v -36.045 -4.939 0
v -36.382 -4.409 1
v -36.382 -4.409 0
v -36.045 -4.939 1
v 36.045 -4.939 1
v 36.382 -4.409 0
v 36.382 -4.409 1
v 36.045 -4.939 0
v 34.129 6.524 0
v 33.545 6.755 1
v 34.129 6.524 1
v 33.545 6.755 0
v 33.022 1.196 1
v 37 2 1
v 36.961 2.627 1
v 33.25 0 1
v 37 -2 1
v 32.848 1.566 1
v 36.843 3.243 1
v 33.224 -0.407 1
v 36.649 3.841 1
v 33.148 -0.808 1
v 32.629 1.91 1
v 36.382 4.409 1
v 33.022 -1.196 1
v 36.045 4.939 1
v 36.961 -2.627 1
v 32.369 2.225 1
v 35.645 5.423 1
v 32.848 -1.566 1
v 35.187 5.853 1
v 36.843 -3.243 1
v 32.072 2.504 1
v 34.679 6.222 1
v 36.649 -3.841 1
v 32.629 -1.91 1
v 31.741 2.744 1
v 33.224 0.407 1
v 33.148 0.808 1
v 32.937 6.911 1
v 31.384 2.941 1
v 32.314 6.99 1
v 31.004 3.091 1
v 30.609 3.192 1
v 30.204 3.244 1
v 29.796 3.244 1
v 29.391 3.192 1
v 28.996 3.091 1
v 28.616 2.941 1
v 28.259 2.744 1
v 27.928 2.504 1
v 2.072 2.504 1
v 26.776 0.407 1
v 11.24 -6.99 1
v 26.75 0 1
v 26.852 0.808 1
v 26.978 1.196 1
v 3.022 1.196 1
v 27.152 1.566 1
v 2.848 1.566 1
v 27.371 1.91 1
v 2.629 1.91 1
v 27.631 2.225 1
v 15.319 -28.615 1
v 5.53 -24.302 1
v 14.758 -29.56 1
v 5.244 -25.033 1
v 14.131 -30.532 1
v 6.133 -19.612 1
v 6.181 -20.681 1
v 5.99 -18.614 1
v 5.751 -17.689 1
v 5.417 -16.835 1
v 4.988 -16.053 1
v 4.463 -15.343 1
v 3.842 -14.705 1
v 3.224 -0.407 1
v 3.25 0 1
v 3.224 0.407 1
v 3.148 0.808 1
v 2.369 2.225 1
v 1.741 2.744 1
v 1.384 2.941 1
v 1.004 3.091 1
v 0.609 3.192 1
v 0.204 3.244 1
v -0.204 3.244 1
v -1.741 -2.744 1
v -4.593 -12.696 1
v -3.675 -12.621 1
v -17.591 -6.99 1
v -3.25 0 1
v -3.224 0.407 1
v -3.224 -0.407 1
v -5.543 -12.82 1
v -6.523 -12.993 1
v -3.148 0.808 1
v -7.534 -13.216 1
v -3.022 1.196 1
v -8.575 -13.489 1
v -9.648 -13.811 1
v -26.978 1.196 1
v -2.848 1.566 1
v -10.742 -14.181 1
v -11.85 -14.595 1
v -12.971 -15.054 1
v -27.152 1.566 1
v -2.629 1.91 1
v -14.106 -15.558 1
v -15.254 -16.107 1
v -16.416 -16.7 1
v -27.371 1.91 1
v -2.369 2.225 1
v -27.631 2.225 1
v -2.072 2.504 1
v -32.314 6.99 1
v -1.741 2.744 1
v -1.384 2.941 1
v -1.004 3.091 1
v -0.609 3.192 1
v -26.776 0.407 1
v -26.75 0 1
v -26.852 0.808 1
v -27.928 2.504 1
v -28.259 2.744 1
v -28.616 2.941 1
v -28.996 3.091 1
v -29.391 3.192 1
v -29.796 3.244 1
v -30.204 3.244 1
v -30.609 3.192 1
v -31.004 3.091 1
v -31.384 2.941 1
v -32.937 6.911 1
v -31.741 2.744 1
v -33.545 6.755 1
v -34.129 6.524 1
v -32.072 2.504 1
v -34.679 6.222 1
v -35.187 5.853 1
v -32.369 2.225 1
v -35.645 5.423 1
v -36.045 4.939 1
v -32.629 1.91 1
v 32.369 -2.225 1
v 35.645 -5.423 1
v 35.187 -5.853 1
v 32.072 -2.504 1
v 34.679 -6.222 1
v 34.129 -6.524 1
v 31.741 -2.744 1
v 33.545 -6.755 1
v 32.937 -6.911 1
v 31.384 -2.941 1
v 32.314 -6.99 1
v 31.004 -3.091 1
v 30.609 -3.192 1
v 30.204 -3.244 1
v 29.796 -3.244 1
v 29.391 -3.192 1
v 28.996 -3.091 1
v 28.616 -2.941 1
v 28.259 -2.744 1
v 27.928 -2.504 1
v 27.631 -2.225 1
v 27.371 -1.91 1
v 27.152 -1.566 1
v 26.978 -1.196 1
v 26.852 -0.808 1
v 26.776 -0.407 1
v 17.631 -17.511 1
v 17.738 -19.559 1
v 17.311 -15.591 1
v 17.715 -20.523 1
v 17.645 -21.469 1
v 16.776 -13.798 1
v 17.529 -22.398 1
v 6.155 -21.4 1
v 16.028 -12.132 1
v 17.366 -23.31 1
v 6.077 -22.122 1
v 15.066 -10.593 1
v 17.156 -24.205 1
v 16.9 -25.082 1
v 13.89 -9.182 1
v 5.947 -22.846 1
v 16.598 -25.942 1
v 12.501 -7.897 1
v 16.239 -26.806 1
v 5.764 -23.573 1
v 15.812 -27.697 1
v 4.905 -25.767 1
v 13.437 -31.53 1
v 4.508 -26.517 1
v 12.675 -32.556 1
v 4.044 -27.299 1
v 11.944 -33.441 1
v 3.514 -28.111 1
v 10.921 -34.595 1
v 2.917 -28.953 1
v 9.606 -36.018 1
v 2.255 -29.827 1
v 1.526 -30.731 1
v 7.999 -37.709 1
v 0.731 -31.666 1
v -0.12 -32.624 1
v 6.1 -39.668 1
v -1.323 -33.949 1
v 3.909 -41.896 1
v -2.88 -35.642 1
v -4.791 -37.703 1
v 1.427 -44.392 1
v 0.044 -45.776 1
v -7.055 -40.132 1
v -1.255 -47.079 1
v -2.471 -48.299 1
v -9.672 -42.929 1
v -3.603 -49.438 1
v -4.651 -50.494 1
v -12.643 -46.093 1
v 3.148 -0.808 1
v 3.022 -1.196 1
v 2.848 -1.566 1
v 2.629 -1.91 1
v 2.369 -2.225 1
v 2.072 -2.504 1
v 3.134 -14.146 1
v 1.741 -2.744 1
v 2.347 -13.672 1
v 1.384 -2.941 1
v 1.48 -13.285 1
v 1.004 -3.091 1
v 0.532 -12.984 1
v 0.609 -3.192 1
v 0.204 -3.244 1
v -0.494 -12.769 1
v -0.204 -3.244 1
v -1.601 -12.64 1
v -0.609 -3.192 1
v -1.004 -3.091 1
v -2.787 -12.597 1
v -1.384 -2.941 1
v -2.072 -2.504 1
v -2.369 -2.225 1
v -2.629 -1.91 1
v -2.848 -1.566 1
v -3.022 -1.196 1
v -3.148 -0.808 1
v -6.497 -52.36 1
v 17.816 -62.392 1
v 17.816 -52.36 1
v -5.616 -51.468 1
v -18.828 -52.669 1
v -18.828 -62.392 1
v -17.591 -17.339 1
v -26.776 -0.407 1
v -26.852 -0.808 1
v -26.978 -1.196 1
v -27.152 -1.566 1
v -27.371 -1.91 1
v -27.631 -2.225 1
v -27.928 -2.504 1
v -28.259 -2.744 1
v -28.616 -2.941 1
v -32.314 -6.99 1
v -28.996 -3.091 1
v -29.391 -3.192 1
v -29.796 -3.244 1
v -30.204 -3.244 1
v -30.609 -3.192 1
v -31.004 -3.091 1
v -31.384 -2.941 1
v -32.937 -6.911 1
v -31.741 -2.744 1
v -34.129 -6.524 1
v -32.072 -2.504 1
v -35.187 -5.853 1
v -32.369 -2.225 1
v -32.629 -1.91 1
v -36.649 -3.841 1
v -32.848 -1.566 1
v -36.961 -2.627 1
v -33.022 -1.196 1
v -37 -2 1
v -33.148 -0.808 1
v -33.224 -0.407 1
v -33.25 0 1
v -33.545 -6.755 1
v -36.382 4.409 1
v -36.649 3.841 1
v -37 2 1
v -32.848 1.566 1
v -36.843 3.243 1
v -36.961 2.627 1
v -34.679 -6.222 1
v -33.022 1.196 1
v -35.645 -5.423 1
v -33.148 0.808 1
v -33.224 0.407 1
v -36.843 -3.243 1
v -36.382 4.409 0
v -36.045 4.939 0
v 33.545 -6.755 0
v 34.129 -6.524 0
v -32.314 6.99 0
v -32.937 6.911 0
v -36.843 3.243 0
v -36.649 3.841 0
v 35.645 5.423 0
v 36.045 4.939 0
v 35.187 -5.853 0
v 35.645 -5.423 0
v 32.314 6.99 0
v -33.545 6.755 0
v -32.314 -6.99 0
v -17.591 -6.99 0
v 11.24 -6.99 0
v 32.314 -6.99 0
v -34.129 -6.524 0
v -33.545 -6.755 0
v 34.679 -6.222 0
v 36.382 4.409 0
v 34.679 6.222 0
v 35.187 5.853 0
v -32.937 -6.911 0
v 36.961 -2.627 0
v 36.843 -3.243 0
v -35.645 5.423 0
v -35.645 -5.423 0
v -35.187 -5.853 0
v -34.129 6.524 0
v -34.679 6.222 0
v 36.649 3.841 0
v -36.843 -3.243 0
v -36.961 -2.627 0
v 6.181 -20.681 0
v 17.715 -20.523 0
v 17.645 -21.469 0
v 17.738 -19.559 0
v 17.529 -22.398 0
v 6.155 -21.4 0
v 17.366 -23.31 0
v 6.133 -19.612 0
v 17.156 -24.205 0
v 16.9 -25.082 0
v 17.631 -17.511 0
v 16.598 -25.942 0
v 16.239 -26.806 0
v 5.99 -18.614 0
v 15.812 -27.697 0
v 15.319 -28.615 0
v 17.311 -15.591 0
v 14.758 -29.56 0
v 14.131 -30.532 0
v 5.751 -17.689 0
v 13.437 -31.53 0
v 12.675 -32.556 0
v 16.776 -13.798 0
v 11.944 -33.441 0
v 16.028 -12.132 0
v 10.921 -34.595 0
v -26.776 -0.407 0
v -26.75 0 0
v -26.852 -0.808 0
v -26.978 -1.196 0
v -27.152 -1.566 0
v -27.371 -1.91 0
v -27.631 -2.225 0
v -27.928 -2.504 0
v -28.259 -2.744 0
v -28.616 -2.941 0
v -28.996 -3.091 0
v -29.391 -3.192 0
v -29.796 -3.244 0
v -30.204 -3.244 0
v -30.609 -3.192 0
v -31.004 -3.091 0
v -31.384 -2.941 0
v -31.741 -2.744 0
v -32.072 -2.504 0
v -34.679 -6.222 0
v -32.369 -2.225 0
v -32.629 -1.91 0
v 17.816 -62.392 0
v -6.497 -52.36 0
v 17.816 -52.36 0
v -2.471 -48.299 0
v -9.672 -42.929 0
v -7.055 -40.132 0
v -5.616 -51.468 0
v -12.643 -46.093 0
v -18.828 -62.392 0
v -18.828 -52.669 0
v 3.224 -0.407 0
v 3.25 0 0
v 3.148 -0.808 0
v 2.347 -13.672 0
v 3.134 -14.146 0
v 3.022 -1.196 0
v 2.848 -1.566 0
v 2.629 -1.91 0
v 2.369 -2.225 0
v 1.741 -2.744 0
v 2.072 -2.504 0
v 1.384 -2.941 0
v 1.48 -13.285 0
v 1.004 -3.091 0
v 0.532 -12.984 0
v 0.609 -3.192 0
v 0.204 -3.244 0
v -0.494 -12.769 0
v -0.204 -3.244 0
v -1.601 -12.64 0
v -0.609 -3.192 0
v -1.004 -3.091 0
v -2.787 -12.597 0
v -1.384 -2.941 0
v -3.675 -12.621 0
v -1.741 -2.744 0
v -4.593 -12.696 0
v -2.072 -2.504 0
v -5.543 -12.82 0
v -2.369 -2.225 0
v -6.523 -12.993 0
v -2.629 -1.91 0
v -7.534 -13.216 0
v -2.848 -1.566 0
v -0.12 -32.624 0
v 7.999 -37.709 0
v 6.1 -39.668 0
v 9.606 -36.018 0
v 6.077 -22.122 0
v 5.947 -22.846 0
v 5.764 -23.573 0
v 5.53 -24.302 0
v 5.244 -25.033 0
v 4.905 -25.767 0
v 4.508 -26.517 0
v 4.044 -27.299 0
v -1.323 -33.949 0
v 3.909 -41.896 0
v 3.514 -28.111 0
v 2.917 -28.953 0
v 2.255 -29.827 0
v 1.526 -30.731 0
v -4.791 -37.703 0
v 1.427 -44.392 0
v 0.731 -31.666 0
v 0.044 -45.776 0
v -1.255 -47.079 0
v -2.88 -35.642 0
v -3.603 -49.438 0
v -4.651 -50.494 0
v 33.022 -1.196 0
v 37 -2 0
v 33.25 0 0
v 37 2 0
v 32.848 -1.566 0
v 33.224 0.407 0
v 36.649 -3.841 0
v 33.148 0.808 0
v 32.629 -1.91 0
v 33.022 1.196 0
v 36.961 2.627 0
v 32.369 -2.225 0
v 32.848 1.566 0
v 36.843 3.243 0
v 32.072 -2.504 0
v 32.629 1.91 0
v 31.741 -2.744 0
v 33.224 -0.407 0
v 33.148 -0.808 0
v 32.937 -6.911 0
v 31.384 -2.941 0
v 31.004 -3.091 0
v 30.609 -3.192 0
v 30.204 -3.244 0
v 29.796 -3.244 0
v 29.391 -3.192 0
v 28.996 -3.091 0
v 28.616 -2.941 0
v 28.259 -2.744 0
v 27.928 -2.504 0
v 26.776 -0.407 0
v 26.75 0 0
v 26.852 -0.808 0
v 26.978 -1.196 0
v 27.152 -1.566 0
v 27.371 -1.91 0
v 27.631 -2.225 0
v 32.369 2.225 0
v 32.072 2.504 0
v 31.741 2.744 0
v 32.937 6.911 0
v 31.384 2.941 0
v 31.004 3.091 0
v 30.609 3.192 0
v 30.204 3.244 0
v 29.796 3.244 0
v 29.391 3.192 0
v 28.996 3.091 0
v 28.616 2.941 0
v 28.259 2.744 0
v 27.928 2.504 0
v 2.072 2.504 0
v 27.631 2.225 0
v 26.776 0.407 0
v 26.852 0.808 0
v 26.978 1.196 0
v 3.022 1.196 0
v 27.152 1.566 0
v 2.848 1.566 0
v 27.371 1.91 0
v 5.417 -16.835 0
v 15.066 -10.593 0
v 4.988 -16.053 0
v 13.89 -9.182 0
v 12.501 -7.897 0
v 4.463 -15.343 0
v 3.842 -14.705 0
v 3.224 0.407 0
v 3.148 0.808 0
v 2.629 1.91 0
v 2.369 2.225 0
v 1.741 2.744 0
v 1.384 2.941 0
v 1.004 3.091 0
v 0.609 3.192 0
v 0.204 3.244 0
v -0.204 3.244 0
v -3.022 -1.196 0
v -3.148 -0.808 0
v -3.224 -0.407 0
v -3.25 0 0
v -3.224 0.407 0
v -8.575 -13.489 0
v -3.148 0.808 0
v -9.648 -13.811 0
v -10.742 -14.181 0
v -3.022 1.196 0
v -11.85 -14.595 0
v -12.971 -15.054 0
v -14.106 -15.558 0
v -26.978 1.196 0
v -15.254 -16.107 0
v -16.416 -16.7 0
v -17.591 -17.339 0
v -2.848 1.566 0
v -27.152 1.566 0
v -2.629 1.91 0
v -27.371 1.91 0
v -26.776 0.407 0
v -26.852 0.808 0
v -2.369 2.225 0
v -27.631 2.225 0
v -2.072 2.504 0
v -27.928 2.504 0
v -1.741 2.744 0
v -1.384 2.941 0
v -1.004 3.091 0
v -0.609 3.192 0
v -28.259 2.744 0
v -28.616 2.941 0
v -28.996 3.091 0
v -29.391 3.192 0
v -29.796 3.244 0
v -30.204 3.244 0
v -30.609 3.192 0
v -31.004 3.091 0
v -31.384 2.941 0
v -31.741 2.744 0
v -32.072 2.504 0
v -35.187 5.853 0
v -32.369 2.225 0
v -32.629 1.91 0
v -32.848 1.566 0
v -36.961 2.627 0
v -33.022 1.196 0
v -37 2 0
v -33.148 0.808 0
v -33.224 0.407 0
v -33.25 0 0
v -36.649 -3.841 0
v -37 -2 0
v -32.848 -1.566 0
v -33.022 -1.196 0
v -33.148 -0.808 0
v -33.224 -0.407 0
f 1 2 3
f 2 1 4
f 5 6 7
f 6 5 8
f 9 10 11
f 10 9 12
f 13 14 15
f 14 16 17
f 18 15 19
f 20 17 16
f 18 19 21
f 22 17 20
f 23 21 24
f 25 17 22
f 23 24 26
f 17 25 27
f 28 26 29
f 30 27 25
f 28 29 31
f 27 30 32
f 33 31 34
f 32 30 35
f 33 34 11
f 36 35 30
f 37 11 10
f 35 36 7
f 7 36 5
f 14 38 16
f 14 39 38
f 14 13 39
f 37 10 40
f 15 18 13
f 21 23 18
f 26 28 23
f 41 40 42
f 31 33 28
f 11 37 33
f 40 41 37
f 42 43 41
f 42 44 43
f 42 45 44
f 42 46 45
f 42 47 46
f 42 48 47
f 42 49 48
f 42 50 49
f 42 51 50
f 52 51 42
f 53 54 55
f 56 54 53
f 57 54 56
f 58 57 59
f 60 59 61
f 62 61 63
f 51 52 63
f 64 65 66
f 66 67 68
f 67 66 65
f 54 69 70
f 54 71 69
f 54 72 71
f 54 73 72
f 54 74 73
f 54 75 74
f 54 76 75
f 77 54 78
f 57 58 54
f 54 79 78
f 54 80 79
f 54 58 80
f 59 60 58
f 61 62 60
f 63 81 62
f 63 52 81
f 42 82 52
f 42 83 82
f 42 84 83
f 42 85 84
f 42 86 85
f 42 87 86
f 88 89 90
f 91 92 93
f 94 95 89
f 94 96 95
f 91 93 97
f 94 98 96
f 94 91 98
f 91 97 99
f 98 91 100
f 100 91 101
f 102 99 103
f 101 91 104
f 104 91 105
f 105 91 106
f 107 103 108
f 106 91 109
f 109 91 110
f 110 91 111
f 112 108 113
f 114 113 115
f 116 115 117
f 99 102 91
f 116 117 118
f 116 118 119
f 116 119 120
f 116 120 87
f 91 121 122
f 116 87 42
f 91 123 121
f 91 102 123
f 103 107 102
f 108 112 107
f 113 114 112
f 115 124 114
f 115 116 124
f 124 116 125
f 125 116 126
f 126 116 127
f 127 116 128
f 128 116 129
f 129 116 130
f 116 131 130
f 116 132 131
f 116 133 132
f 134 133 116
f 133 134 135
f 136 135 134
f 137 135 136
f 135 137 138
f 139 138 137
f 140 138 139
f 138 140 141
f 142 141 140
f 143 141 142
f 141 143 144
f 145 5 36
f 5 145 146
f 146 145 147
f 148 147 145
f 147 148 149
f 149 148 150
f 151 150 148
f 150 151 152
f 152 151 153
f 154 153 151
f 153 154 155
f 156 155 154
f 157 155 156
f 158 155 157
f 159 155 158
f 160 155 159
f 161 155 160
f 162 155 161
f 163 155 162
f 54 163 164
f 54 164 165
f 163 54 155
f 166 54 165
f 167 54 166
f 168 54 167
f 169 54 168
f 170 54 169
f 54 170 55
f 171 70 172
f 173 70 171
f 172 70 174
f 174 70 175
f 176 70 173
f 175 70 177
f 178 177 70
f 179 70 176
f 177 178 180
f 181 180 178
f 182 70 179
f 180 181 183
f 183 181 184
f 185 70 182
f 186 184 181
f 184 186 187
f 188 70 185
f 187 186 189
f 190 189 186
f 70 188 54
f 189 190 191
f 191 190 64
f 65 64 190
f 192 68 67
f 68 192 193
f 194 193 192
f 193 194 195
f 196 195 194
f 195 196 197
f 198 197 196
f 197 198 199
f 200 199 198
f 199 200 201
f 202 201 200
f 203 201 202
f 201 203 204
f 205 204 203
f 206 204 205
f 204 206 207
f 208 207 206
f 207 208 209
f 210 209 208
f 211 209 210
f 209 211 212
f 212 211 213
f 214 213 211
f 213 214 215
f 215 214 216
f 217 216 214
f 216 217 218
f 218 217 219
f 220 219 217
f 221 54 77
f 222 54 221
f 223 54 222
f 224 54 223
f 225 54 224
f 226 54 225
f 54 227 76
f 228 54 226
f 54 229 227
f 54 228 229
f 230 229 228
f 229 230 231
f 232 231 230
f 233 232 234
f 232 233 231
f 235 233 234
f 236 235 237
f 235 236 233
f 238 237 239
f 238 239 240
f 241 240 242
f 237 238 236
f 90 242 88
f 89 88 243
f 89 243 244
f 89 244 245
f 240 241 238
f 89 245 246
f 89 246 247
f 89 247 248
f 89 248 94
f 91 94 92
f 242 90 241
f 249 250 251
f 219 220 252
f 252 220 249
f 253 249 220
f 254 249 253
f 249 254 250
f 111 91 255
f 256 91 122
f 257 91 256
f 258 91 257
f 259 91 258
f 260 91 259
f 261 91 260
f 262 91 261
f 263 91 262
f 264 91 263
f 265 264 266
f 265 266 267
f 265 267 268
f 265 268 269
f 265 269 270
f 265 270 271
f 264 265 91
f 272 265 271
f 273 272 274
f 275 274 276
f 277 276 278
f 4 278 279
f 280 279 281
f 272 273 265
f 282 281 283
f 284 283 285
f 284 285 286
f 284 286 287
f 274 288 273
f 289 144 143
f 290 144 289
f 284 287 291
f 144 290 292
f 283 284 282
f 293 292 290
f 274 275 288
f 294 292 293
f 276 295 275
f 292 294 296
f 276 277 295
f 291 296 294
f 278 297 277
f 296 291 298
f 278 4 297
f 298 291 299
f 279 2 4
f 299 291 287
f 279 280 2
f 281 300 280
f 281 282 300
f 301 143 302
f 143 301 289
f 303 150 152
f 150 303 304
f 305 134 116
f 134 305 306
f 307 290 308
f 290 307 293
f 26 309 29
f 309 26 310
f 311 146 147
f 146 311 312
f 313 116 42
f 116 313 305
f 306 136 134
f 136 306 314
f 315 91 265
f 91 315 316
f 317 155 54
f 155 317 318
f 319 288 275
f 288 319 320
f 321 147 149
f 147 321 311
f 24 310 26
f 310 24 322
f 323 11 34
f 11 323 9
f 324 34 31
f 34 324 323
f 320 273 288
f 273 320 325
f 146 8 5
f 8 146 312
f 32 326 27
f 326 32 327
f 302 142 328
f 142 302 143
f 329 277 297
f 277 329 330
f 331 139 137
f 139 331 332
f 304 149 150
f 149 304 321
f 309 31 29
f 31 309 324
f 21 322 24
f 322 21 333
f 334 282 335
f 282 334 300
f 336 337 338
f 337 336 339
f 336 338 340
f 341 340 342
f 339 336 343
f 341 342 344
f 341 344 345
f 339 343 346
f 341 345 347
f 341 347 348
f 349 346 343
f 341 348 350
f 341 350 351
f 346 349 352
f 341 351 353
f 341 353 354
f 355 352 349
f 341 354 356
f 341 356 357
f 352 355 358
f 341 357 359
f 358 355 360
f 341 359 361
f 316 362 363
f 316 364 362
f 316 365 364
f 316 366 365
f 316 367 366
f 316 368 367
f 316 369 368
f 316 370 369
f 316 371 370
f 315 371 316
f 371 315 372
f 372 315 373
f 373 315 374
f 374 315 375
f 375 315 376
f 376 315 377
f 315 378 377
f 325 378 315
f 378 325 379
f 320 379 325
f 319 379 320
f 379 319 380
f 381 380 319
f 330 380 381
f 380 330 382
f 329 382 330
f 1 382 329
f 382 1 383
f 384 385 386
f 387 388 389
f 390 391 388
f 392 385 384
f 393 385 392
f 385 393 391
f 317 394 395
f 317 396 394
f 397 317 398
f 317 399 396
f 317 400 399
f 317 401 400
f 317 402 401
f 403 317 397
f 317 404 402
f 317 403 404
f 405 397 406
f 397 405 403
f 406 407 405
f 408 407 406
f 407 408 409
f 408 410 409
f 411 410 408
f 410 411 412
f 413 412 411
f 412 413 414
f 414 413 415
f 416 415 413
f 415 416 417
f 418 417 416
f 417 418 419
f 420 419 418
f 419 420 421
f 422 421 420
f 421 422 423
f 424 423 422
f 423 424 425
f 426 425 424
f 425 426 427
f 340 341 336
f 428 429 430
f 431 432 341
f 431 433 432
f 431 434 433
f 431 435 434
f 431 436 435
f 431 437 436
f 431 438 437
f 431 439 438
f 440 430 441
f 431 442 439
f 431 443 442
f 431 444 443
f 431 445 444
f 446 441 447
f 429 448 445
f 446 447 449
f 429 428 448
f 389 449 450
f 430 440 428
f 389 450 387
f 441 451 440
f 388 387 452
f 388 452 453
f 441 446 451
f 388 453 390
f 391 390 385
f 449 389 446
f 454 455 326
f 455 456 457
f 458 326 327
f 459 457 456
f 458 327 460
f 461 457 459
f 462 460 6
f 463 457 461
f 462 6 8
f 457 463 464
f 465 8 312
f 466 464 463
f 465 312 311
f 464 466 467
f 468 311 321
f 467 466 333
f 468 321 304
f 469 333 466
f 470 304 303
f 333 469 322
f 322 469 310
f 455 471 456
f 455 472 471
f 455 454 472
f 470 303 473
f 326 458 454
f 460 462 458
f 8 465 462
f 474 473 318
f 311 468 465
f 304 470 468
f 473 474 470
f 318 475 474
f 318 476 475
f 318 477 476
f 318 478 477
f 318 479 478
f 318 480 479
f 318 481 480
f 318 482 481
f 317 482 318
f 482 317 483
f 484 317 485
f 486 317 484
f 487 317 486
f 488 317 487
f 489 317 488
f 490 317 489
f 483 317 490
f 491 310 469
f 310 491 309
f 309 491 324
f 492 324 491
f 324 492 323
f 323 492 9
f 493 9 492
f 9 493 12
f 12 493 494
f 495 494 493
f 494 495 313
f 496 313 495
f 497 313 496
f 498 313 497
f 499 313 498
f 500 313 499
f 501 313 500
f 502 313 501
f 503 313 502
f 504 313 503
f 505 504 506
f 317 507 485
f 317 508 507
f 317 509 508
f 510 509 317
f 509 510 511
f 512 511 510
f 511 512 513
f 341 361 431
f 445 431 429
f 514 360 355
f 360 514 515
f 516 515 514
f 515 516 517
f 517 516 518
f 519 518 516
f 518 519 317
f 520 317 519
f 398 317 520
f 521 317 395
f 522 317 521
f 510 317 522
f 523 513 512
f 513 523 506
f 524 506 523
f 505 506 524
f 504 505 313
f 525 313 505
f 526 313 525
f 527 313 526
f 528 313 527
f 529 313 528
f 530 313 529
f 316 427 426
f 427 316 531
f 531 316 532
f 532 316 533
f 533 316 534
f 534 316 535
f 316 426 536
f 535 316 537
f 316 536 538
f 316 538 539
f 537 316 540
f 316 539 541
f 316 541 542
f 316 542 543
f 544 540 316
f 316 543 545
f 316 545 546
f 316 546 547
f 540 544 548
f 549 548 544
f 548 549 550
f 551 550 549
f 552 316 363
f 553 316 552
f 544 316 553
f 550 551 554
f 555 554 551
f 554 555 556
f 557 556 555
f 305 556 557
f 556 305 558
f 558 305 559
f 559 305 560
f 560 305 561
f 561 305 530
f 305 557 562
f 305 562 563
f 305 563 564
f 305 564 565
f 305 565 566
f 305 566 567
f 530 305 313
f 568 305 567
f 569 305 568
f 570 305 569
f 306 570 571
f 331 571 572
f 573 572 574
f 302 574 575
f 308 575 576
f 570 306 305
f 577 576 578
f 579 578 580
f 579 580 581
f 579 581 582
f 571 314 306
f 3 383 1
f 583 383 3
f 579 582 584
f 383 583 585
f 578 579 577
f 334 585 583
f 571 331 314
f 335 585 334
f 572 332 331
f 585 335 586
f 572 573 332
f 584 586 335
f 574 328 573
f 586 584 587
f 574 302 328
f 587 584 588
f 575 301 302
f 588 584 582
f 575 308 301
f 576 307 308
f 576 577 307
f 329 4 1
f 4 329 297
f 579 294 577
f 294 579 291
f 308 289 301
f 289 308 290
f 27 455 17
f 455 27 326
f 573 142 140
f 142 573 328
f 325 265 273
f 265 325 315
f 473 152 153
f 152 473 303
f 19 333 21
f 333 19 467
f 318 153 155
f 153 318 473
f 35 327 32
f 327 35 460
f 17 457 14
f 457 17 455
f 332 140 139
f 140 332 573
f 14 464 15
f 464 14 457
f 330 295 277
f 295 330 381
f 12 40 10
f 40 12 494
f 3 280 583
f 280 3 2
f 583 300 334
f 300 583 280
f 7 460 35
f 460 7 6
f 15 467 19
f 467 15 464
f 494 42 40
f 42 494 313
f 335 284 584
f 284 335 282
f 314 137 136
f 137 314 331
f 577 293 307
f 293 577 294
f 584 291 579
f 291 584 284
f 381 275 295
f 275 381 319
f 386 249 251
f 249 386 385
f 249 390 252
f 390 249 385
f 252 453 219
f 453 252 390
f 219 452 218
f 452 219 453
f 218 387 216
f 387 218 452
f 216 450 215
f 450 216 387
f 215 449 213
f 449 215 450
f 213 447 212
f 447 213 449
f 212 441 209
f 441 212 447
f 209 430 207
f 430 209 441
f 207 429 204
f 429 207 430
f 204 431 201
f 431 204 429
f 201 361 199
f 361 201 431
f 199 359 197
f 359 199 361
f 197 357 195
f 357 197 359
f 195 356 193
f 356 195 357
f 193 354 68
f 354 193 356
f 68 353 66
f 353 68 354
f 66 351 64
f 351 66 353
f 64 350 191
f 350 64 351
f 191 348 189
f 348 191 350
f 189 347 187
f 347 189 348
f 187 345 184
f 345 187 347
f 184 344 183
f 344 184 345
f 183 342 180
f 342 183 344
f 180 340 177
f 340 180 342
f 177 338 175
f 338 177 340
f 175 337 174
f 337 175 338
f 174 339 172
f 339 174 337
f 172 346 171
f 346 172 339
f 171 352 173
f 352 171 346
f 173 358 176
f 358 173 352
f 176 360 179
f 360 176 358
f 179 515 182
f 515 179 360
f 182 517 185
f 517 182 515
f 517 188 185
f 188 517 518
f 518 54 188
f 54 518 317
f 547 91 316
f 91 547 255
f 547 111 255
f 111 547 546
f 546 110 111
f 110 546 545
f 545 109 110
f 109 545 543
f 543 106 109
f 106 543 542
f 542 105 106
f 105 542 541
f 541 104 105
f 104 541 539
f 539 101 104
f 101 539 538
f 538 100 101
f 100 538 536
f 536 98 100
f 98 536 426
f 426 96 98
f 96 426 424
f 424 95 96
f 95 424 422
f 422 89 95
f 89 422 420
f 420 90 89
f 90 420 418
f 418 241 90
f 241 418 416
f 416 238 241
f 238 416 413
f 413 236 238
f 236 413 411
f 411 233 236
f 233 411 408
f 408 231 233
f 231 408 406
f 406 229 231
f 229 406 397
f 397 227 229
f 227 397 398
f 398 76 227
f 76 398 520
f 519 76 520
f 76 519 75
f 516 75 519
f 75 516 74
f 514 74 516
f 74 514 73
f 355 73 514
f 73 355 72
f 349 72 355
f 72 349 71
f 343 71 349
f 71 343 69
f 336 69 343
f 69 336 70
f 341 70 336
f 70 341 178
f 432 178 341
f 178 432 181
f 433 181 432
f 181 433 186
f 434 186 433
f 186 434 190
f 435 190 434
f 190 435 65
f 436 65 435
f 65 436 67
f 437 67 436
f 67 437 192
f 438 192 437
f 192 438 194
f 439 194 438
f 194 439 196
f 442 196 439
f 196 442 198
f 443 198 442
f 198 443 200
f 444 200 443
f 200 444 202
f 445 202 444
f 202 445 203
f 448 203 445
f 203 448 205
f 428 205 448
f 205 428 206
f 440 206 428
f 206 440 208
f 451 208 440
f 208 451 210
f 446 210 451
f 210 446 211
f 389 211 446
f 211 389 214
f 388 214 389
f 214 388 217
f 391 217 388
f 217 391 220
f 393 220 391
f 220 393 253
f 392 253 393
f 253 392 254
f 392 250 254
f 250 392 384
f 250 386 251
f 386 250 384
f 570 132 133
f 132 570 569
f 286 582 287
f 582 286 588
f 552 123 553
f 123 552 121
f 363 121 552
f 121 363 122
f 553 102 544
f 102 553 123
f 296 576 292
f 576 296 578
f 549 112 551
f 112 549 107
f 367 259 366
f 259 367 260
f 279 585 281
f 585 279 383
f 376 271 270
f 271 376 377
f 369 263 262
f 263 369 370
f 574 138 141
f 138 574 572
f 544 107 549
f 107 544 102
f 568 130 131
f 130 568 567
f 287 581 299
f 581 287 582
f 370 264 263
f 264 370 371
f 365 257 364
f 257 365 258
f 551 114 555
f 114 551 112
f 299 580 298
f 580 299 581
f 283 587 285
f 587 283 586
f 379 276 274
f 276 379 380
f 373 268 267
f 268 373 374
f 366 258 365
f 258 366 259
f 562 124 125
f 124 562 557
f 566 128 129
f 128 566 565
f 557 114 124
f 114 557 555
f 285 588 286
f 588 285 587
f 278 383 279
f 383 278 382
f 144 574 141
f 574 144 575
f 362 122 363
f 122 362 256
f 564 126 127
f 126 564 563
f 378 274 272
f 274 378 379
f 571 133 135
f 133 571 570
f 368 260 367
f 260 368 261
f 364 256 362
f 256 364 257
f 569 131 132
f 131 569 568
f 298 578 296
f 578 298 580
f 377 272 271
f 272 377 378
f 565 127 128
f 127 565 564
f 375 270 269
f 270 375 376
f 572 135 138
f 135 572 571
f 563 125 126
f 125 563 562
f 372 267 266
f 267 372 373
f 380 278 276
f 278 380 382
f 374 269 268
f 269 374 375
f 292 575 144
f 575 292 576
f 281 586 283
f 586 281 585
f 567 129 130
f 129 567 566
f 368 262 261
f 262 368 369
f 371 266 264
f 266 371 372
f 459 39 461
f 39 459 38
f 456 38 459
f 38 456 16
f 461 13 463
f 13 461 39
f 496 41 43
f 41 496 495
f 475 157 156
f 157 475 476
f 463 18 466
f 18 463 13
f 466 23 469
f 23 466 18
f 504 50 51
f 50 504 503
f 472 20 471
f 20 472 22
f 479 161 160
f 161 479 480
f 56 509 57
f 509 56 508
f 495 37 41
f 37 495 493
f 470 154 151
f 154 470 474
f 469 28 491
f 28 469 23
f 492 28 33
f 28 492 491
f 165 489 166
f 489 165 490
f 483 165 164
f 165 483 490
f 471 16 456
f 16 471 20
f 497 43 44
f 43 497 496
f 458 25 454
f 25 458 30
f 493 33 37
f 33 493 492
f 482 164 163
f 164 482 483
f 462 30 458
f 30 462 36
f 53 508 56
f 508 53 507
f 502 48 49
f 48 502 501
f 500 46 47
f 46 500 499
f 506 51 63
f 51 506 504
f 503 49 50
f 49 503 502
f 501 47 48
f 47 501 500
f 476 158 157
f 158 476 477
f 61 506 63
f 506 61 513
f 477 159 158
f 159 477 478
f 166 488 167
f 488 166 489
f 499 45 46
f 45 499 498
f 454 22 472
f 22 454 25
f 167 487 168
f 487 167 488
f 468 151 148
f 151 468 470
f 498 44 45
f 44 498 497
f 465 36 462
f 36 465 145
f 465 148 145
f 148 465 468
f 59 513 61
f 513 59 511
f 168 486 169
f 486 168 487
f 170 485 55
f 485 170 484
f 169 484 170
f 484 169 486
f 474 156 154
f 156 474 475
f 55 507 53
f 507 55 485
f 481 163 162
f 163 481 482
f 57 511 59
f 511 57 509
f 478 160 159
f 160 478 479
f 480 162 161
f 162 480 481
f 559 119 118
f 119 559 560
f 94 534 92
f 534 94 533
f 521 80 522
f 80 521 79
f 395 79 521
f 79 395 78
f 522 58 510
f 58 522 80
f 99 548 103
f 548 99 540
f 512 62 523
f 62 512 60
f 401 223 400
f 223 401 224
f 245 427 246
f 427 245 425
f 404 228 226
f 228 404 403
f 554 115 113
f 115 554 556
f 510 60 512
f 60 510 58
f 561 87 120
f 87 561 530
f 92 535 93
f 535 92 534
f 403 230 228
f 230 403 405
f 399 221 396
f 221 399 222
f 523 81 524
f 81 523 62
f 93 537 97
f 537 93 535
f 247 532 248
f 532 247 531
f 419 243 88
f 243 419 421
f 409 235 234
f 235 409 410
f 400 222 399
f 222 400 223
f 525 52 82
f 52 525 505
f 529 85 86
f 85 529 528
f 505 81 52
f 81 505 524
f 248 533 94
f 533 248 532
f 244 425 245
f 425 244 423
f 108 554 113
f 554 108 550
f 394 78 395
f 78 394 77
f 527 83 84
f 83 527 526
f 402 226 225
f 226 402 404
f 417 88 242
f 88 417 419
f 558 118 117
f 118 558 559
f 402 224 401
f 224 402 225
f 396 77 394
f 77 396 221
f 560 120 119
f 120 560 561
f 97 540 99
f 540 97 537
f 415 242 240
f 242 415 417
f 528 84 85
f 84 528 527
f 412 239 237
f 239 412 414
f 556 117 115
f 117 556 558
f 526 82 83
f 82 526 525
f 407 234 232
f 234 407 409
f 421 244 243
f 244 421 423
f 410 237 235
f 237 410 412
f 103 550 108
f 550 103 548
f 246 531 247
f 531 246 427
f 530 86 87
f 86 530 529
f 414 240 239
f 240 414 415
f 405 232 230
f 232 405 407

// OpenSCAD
$fn = 50;


difference() {
	union() {
		translate(v = [0, 0, 0]) {
			rotate(a = [0, 0, 0]) {
				hull() {
					translate(v = [-32.0000000000, 2.0000000000, 0]) {
						rotate(a = [0, 0, 0]) {
							translate(v = [0, 0, 0]) {
								rotate(a = [0, 0, 0]) {
									cylinder(h = 1, r = 5);
								}
							}
						}
					}
					translate(v = [32.0000000000, 2.0000000000, 0]) {
						rotate(a = [0, 0, 0]) {
							translate(v = [0, 0, 0]) {
								rotate(a = [0, 0, 0]) {
									cylinder(h = 1, r = 5);
								}
							}
						}
					}
					translate(v = [-32.0000000000, -2.0000000000, 0]) {
						rotate(a = [0, 0, 0]) {
							translate(v = [0, 0, 0]) {
								rotate(a = [0, 0, 0]) {
									cylinder(h = 1, r = 5);
								}
							}
						}
					}
					translate(v = [32.0000000000, -2.0000000000, 0]) {
						rotate(a = [0, 0, 0]) {
							translate(v = [0, 0, 0]) {
								rotate(a = [0, 0, 0]) {
									cylinder(h = 1, r = 5);
								}
							}
						}
					}
				}
			}
		}
		translate(v = [0, -5, 0]) {
			rotate(a = [0, 0, 0]) {
				linear_extrude(height = 1) {
					text(font = "DejaVu Sans Mono:style=Bold", halign = "center", size = 57.0000000000, text = "2", valign = "top");
				}
			}
		}
	}
	union() {
		translate(v = [-30.0000000000, 0.0000000000, -125.0000000000]) {
			rotate(a = [0, 0, 0]) {
				cylinder(h = 250, r = 3.2500000000);
			}
		}
		translate(v = [30.0000000000, 0.0000000000, -125.0000000000]) {
			rotate(a = [0, 0, 0]) {
				cylinder(h = 250, r = 3.2500000000);
			}
		}
		translate(v = [30.0000000000, 0.0000000000, -125.0000000000]) {
			rotate(a = [0, 0, 0]) {
				cylinder(h = 250, r = 3.2500000000);
			}
		}
		translate(v = [0, 0, -125.0000000000]) {
			rotate(a = [0, 0, 0]) {
				cylinder(h = 250, r = 3.2500000000);
			}
		}
	}
}
